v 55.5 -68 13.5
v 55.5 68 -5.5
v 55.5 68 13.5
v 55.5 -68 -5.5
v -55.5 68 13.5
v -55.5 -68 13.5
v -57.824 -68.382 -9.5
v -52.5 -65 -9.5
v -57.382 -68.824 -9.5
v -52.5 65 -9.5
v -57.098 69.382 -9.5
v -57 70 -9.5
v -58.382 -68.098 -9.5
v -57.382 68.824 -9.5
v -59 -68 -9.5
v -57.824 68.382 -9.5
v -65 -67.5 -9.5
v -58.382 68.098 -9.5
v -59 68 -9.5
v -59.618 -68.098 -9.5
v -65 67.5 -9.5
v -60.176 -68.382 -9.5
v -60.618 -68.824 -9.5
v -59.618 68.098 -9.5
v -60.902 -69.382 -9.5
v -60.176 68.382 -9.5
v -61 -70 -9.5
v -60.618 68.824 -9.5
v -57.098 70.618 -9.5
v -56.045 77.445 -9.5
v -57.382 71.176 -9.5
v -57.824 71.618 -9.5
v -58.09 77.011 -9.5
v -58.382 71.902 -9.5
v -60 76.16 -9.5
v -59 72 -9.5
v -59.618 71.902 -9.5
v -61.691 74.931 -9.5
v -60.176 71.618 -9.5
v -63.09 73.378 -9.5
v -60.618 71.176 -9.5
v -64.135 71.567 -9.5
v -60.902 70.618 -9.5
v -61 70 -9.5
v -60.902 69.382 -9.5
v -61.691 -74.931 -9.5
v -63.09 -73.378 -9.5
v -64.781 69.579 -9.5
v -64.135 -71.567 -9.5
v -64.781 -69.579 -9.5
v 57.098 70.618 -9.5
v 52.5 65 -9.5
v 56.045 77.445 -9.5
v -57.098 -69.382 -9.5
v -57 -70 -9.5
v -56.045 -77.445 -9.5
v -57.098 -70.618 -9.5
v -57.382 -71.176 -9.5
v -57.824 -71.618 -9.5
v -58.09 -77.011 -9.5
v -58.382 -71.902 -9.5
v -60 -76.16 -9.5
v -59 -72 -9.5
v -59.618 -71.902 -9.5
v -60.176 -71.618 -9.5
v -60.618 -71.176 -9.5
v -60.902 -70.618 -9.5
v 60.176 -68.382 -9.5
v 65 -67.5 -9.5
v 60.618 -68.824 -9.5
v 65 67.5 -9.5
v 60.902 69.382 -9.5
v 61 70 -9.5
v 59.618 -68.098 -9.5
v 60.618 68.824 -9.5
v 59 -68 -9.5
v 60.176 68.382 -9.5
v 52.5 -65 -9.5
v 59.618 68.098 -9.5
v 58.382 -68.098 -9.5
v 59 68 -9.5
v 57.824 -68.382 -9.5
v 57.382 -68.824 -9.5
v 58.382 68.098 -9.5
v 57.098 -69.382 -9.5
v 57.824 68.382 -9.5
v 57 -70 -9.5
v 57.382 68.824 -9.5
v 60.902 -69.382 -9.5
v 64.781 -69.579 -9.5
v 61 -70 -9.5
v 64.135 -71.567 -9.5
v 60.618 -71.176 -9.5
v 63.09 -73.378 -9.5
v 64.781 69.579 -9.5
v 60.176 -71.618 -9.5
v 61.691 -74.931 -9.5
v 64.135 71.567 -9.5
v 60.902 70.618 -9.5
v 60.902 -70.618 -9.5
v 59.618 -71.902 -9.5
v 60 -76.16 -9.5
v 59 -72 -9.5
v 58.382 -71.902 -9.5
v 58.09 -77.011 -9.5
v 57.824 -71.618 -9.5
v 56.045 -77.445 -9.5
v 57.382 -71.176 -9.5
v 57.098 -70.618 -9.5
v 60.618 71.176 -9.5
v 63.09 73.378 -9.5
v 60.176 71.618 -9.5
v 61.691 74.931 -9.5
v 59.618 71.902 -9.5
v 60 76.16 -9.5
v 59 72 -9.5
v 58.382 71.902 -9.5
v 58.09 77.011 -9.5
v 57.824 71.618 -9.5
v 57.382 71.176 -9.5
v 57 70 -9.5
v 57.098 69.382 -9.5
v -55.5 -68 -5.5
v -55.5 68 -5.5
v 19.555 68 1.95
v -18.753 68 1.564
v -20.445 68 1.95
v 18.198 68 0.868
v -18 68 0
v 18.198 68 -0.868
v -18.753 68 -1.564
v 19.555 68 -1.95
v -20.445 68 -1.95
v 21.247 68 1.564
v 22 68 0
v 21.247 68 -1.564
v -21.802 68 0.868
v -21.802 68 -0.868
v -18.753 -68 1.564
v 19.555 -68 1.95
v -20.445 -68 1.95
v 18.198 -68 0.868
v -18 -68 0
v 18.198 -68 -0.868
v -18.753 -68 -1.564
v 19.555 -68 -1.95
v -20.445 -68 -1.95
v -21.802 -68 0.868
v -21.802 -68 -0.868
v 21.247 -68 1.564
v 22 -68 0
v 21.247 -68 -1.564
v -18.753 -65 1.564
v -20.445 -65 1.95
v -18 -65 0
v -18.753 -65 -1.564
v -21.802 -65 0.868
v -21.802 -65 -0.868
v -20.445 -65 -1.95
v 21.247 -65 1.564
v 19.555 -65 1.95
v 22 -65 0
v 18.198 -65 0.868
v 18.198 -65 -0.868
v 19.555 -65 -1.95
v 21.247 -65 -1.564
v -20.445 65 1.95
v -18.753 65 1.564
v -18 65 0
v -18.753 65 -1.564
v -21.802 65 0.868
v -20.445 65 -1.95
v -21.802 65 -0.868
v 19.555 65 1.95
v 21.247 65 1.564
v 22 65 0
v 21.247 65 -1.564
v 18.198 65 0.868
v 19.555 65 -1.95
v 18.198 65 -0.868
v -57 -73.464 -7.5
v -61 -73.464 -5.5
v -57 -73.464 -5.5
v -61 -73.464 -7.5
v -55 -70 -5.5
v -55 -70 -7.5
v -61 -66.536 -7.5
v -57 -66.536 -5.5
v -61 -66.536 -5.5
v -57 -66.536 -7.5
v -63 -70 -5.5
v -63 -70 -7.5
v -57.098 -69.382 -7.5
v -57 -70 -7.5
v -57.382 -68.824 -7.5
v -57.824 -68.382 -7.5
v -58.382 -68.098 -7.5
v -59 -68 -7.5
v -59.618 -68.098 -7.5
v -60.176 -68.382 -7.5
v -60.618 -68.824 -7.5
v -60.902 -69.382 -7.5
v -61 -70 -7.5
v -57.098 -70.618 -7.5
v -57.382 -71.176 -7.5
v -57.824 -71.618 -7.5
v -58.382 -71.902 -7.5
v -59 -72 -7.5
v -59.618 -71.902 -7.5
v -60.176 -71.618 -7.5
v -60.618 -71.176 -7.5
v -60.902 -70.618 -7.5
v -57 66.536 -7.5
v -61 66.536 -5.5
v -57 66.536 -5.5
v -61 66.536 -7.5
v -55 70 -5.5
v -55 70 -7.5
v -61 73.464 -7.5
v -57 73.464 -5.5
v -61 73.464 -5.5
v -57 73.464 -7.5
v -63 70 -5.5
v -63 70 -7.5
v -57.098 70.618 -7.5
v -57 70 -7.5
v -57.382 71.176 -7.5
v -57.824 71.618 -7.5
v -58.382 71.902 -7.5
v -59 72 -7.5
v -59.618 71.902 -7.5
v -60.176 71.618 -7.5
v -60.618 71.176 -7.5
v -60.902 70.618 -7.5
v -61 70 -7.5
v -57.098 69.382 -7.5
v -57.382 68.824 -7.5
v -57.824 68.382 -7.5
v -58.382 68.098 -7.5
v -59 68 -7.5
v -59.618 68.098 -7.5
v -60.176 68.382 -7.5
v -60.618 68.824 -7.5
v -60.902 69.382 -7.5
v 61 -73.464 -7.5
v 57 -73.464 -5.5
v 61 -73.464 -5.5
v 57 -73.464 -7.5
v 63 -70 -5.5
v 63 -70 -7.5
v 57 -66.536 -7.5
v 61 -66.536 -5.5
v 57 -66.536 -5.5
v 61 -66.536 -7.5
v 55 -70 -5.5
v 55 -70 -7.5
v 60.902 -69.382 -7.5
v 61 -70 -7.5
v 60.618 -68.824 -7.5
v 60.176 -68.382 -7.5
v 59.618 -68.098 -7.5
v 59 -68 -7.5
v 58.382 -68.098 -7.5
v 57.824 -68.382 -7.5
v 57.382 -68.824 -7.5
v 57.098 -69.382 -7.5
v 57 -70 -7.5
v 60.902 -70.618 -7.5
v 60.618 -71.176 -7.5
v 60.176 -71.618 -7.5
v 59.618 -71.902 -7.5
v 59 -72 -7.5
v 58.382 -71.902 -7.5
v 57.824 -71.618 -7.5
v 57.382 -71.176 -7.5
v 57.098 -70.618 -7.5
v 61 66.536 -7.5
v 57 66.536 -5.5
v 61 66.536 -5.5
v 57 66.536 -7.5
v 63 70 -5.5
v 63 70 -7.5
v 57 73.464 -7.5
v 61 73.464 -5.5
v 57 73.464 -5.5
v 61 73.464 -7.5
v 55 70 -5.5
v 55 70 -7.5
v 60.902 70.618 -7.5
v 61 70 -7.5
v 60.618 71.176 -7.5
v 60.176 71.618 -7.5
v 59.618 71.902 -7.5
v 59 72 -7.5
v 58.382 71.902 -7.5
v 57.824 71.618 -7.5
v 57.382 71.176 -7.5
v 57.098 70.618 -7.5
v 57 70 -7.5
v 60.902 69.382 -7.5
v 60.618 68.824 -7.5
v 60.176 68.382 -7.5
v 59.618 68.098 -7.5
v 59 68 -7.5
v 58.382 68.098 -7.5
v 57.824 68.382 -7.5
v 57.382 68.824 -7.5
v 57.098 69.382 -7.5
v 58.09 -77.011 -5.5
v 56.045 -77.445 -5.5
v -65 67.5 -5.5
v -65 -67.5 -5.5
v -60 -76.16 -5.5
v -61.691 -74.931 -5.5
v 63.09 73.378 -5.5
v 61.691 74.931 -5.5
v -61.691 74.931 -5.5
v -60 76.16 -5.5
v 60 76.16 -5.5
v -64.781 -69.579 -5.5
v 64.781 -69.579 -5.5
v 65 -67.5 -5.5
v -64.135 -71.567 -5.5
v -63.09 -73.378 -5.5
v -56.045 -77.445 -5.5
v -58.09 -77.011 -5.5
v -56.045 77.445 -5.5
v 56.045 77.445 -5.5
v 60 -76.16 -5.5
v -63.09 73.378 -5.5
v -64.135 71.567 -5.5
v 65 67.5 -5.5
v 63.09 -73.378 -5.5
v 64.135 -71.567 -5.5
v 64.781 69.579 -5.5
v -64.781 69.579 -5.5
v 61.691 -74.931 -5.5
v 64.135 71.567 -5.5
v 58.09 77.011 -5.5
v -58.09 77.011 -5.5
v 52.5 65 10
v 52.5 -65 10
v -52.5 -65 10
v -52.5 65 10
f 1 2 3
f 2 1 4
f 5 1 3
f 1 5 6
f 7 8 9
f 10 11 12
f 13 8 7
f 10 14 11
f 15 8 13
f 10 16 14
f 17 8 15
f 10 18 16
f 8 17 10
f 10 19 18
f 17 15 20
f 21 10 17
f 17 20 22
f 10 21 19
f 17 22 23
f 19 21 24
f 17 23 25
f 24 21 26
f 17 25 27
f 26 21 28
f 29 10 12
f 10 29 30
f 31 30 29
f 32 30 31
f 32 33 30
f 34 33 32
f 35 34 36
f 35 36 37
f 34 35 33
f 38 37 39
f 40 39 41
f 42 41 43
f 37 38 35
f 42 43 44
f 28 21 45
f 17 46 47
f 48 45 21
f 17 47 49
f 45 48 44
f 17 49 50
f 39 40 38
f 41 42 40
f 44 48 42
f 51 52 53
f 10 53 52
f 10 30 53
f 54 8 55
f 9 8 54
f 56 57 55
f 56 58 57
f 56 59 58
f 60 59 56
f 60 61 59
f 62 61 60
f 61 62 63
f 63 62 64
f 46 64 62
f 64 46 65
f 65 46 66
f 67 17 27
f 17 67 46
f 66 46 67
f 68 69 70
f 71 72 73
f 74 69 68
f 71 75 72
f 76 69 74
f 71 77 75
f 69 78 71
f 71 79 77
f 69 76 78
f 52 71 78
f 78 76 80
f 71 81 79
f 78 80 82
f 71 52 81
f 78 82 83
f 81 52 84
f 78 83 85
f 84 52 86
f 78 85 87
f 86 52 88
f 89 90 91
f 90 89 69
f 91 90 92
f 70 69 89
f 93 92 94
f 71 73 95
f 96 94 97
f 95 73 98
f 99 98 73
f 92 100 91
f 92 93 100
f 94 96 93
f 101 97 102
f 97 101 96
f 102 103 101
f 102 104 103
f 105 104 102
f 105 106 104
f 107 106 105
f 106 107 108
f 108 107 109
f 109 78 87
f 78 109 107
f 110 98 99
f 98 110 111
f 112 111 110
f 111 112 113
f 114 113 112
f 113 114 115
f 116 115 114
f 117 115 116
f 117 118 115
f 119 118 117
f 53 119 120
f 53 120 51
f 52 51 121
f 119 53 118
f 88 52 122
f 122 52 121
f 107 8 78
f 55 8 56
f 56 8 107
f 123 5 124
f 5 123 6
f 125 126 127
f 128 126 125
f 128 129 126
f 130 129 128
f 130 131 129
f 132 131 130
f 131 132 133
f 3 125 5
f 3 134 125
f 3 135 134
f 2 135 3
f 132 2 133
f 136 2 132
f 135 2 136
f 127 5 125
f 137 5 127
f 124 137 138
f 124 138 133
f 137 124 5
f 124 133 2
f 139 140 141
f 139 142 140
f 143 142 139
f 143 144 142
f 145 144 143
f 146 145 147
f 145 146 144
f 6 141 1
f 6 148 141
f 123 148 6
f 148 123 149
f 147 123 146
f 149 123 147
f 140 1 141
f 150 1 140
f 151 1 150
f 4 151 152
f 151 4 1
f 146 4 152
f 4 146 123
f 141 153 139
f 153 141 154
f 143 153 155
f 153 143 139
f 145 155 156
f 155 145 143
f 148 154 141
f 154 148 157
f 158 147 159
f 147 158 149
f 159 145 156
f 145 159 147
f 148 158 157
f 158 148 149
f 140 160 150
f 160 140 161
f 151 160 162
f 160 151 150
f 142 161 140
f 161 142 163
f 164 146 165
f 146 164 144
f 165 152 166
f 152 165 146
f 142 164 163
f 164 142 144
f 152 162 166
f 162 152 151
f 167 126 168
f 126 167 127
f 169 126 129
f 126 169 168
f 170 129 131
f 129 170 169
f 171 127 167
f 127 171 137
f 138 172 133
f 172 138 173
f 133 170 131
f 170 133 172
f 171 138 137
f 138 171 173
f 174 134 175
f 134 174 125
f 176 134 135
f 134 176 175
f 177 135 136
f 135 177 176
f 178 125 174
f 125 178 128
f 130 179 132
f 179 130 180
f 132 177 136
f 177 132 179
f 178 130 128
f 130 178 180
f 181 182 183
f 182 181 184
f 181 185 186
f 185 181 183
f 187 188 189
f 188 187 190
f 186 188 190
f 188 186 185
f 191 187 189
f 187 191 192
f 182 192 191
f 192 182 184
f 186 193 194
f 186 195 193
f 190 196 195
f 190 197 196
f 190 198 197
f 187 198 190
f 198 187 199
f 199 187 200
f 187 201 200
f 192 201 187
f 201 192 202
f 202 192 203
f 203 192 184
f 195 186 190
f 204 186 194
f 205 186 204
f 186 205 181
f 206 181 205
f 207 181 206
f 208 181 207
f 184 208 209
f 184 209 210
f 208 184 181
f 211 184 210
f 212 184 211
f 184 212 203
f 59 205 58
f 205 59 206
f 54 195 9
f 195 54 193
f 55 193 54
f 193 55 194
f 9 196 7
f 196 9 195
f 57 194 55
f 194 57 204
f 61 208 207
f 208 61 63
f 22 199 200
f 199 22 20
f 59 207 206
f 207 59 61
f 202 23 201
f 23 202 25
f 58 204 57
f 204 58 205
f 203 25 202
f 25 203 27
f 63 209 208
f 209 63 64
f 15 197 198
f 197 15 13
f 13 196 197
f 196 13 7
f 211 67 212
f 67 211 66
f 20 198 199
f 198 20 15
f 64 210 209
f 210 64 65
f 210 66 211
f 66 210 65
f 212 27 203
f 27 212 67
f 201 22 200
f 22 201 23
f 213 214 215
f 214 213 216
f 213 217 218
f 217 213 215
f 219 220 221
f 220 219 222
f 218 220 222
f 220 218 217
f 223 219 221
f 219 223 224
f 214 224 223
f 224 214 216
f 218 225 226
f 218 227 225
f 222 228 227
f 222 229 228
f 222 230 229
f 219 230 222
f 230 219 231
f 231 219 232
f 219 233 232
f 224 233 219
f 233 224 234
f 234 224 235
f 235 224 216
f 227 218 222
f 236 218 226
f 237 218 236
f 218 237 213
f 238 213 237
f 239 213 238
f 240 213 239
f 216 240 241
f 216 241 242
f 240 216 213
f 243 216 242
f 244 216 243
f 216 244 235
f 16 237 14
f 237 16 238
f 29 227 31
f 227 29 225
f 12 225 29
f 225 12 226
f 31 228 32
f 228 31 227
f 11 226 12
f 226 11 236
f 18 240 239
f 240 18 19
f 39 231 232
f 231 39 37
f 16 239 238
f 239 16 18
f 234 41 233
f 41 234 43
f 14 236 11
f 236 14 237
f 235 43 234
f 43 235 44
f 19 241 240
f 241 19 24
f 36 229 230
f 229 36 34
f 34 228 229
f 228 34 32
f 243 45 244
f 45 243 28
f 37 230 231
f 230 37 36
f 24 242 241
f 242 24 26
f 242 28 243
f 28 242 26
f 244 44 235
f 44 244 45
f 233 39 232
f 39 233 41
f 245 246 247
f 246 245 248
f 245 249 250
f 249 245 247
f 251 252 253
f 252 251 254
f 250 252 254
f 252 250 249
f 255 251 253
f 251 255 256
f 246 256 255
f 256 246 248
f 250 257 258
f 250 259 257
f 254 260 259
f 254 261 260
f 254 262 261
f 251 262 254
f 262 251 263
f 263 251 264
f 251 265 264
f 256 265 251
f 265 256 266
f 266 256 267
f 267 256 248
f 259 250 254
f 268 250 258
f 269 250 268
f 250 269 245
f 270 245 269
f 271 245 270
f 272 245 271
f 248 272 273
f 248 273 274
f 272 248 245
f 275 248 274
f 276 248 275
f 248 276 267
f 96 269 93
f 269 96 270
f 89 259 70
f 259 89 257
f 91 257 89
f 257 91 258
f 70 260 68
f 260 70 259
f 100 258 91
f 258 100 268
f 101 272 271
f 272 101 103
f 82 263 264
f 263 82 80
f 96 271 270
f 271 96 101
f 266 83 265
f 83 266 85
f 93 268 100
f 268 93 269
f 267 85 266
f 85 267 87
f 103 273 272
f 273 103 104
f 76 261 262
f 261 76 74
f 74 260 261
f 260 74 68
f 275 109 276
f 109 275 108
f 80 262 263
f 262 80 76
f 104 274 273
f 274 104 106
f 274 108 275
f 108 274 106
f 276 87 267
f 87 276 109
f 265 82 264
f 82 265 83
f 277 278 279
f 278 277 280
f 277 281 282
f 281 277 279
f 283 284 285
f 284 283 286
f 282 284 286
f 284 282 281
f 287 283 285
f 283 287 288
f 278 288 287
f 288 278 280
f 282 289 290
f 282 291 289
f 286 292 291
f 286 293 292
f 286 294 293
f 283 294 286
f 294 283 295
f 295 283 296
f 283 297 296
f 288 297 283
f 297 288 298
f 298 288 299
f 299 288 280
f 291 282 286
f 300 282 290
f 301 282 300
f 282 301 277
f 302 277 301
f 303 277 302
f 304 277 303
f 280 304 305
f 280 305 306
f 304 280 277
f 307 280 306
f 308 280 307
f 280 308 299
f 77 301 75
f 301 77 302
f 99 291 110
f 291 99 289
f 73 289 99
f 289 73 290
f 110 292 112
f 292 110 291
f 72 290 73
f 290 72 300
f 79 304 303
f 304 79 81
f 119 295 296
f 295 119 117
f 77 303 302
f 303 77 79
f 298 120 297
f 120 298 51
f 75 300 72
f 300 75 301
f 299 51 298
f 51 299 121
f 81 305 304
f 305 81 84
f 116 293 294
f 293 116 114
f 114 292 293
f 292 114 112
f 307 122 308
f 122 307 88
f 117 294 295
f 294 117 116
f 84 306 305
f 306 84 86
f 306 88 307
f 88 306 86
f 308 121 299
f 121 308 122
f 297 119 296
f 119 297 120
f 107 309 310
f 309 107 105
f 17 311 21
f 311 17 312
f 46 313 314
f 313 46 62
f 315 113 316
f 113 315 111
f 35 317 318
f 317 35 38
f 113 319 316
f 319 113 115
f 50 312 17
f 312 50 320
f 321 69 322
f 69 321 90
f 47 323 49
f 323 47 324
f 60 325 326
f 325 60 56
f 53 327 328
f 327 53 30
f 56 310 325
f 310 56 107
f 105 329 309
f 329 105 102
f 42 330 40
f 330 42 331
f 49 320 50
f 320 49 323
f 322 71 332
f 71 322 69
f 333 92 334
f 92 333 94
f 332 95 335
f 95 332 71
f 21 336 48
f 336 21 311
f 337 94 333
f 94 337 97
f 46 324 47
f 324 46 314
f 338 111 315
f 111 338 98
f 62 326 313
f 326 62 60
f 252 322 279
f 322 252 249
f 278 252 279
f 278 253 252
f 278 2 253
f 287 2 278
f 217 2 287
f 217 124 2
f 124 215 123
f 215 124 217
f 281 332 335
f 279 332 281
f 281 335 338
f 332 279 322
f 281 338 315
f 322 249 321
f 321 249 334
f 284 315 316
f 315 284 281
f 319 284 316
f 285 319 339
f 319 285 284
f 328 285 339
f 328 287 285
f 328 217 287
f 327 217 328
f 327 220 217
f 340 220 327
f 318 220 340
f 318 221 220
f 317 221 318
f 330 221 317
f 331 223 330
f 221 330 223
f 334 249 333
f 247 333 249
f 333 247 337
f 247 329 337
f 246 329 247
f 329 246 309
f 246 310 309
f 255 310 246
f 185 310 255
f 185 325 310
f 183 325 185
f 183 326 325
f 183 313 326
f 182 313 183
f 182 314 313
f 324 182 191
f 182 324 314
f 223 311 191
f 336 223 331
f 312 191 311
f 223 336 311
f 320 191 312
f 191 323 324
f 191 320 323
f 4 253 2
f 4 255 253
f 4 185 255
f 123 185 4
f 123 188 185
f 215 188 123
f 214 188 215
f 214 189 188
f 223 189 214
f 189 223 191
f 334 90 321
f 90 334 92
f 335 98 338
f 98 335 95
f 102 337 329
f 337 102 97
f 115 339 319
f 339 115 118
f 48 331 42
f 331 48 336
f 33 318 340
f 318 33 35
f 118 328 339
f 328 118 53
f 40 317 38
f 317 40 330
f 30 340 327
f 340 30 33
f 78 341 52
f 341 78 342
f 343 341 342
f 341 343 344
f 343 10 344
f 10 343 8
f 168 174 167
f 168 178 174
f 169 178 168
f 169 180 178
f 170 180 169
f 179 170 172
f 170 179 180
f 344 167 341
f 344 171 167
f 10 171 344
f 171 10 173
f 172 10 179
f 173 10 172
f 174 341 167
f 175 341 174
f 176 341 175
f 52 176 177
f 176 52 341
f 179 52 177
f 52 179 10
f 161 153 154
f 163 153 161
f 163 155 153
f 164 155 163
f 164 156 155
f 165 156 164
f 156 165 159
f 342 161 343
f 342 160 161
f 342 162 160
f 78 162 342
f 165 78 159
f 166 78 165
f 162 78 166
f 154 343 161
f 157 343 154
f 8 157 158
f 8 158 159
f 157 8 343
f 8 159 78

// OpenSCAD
/*
 * Written by Dermot Tynan, Kalopa Research.
 * GPLv2.
 *
 * This is the definition for the five mast supports on the upper
 * leading-edge of the mast, A8 -> A12.
 *
 * All dimensions are in mm.
 */

module m4_nut_trap()
{
	union() {
		translate([0, 0, -2]) cylinder(r = 4, h = 8, $fn = 6, center = true);
		cylinder(r = 2, h = 20, center = true, $fn = 20);
	}
}

module board_housing()
{
	difference() {
		translate([0, 0, 2]) cube([111, 136, 23], center = true);
		translate([-20, -65, 0]) rotate([90, 0, 0]) cylinder(r = 2, h = 10, center = true);
		translate([20, -65, 0]) rotate([90, 0, 0]) cylinder(r = 2, h = 10, center = true);
		translate([-20, 65, 0]) rotate([90, 0, 0]) cylinder(r = 2, h = 10, center = true);
		translate([20, 65, 0]) rotate([90, 0, 0]) cylinder(r = 2, h = 10, center = true);
	}
}

module deck_mounting()
{
	difference() {
		minkowski() {
			cube([110, 135, 2], center = true);
			cylinder(r = 10, h = 2, center = true);
		}
		translate([-59, -70, 6]) m4_nut_trap();
		translate([-59, 70, 6]) m4_nut_trap();
		translate([59, -70, 6]) m4_nut_trap();
		translate([59, 70, 6]) m4_nut_trap();
	}
}

module mocon_box()
{
	difference() {
		union() {
			board_housing();
			translate([0, 0, -7.5]) deck_mounting();
		}
		cube([105, 130, 20], center = true);
	}
}

mocon_box();
